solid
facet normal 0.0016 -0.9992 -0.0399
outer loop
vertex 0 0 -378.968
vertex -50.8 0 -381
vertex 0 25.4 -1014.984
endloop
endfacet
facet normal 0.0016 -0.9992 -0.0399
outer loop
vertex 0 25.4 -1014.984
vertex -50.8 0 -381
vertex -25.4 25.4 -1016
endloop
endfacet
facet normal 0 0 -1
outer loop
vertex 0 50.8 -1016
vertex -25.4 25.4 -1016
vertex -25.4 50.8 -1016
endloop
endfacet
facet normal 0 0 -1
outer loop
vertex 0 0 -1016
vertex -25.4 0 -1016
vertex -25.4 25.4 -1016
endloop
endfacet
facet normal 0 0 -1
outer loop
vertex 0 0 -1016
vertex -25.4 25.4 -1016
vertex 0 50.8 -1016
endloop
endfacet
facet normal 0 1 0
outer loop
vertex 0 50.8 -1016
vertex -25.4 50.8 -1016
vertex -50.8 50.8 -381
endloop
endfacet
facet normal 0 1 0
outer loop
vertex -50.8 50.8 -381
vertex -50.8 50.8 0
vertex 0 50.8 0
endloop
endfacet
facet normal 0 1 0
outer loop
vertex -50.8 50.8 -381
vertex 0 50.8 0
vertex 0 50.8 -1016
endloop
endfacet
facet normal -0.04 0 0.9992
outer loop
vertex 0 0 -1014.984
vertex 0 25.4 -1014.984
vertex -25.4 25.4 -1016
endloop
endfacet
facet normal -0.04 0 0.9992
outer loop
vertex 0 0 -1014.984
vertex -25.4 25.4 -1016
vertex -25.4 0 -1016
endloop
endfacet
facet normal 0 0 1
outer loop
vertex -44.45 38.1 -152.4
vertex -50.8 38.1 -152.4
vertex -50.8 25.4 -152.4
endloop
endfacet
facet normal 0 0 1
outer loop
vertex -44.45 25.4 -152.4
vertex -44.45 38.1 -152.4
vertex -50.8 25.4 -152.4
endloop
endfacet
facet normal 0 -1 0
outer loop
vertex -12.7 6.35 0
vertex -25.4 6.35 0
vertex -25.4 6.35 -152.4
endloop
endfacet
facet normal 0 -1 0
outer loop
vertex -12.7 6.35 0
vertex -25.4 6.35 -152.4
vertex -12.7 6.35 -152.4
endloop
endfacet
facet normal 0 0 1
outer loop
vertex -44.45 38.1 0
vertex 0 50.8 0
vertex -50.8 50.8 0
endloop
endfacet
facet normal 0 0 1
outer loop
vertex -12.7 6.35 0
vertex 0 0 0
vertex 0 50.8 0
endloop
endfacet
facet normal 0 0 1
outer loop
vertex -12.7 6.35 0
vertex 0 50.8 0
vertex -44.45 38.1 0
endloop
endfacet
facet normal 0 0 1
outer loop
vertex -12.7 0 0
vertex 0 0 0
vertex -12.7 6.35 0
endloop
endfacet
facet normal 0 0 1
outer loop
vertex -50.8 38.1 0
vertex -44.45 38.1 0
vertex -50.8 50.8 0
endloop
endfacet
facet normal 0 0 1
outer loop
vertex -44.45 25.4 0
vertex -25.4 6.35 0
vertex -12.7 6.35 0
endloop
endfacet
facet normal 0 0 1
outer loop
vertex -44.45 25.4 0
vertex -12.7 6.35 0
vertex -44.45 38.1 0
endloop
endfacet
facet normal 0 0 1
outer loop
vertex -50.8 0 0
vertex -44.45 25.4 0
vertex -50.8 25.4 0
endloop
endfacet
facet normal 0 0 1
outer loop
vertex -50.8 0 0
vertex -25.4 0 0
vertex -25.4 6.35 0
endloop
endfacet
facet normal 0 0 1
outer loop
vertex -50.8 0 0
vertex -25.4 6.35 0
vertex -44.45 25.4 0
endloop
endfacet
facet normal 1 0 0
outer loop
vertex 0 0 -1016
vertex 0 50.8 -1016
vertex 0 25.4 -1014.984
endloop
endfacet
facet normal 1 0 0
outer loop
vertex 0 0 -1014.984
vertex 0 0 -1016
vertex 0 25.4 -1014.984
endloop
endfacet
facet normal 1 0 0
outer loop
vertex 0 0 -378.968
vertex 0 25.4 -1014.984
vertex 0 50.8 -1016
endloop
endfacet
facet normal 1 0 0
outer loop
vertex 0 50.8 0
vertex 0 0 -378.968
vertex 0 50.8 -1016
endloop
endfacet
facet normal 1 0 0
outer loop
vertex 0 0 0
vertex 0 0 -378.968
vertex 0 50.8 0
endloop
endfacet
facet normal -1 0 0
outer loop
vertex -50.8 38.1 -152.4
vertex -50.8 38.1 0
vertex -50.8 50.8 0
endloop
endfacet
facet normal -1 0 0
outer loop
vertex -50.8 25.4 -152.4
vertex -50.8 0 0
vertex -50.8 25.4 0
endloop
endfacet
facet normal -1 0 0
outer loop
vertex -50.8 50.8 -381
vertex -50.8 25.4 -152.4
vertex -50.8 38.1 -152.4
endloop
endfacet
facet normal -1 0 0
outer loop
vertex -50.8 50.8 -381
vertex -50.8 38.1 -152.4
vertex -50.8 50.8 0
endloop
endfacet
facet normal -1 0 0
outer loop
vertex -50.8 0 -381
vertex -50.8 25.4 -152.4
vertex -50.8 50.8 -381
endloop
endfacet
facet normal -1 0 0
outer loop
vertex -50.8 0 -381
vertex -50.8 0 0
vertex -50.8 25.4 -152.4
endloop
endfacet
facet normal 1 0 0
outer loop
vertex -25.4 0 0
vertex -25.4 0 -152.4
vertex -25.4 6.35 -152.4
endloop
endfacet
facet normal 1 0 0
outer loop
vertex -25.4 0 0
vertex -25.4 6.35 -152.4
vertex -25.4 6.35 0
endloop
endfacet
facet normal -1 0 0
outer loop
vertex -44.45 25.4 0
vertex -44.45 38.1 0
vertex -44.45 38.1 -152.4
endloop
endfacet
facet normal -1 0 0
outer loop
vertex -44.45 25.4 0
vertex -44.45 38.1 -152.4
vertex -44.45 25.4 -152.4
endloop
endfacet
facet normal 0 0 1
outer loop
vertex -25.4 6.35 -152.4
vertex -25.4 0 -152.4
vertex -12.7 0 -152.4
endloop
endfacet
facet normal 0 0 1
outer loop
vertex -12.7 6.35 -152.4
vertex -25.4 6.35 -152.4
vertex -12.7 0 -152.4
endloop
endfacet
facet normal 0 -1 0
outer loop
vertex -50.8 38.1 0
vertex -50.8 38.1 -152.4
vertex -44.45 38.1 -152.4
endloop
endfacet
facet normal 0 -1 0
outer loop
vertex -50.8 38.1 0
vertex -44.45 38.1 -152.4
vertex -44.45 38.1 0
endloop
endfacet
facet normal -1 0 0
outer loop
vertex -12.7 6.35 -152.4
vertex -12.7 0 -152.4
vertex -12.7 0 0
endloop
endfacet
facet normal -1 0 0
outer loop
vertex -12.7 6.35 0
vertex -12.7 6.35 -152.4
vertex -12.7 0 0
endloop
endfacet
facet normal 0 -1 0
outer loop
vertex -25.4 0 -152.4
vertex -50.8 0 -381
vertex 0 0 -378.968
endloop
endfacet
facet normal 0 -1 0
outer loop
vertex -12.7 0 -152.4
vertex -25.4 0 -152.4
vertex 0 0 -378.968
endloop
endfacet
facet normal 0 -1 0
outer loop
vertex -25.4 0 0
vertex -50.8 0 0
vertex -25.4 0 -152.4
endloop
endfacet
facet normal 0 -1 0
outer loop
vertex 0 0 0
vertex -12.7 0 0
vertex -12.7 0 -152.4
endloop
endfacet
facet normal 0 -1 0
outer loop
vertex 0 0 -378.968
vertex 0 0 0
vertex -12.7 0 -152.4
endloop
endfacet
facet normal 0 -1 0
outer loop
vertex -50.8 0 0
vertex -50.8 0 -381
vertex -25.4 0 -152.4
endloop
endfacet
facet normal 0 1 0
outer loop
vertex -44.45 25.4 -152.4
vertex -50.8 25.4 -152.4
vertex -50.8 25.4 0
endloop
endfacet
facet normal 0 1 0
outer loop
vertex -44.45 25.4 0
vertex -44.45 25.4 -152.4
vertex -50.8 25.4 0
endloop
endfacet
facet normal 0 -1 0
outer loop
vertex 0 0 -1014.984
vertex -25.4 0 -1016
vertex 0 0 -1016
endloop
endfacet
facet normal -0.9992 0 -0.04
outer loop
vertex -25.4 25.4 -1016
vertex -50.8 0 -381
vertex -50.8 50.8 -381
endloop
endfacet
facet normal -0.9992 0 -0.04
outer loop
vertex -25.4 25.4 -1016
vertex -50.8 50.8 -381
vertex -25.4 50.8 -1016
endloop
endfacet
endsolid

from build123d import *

# Parameters (mm, degrees)
F1_DEPTH = 50.8
F2_W     = 12.7
F2_H     = 152.4
F3_DEPTH = 6.35
F5_DEPTH = 65.988231
F6_W     = 12.7
F6_H     = 152.4
F7_DEPTH = 6.35


with BuildPart() as f1:
    # F0 (on Front) → F1 (new body)
    with BuildSketch(Plane.XZ):
        Polygon((0, -1016), (0, 0), (-50.8, 0), (-50.8, -381), (-25.4, -1016), align=None)
    extrude(amount=-F1_DEPTH)

    # F2 (on face) → F3 (cut)
    with BuildSketch(Plane(origin=(-50.8, 0, 0), x_dir=(0, -1, 0), z_dir=(-1, 0, 0))):
        with Locations((-31.75, -76.2)):
            Rectangle(F2_W, F2_H)
    extrude(amount=-F3_DEPTH, mode=Mode.SUBTRACT)

    # F4 (on face) → F5 (cut, through all)
    with BuildSketch(Plane(origin=(-65.934505, 0, -2.63738), x_dir=(0, -1, 0), z_dir=(-0.999201, 0, -0.039968))):
        Polygon((0, -1014.172986), (0, -378.665189), (-25.4, -1014.172986), align=None)
    extrude(amount=-F5_DEPTH, mode=Mode.SUBTRACT)

    # F6 (on face) → F7 (cut)
    with BuildSketch(Plane.XZ):
        with Locations((-19.05, -76.2)):
            Rectangle(F6_W, F6_H)
    extrude(amount=-F7_DEPTH, mode=Mode.SUBTRACT)


solid = f1.part
